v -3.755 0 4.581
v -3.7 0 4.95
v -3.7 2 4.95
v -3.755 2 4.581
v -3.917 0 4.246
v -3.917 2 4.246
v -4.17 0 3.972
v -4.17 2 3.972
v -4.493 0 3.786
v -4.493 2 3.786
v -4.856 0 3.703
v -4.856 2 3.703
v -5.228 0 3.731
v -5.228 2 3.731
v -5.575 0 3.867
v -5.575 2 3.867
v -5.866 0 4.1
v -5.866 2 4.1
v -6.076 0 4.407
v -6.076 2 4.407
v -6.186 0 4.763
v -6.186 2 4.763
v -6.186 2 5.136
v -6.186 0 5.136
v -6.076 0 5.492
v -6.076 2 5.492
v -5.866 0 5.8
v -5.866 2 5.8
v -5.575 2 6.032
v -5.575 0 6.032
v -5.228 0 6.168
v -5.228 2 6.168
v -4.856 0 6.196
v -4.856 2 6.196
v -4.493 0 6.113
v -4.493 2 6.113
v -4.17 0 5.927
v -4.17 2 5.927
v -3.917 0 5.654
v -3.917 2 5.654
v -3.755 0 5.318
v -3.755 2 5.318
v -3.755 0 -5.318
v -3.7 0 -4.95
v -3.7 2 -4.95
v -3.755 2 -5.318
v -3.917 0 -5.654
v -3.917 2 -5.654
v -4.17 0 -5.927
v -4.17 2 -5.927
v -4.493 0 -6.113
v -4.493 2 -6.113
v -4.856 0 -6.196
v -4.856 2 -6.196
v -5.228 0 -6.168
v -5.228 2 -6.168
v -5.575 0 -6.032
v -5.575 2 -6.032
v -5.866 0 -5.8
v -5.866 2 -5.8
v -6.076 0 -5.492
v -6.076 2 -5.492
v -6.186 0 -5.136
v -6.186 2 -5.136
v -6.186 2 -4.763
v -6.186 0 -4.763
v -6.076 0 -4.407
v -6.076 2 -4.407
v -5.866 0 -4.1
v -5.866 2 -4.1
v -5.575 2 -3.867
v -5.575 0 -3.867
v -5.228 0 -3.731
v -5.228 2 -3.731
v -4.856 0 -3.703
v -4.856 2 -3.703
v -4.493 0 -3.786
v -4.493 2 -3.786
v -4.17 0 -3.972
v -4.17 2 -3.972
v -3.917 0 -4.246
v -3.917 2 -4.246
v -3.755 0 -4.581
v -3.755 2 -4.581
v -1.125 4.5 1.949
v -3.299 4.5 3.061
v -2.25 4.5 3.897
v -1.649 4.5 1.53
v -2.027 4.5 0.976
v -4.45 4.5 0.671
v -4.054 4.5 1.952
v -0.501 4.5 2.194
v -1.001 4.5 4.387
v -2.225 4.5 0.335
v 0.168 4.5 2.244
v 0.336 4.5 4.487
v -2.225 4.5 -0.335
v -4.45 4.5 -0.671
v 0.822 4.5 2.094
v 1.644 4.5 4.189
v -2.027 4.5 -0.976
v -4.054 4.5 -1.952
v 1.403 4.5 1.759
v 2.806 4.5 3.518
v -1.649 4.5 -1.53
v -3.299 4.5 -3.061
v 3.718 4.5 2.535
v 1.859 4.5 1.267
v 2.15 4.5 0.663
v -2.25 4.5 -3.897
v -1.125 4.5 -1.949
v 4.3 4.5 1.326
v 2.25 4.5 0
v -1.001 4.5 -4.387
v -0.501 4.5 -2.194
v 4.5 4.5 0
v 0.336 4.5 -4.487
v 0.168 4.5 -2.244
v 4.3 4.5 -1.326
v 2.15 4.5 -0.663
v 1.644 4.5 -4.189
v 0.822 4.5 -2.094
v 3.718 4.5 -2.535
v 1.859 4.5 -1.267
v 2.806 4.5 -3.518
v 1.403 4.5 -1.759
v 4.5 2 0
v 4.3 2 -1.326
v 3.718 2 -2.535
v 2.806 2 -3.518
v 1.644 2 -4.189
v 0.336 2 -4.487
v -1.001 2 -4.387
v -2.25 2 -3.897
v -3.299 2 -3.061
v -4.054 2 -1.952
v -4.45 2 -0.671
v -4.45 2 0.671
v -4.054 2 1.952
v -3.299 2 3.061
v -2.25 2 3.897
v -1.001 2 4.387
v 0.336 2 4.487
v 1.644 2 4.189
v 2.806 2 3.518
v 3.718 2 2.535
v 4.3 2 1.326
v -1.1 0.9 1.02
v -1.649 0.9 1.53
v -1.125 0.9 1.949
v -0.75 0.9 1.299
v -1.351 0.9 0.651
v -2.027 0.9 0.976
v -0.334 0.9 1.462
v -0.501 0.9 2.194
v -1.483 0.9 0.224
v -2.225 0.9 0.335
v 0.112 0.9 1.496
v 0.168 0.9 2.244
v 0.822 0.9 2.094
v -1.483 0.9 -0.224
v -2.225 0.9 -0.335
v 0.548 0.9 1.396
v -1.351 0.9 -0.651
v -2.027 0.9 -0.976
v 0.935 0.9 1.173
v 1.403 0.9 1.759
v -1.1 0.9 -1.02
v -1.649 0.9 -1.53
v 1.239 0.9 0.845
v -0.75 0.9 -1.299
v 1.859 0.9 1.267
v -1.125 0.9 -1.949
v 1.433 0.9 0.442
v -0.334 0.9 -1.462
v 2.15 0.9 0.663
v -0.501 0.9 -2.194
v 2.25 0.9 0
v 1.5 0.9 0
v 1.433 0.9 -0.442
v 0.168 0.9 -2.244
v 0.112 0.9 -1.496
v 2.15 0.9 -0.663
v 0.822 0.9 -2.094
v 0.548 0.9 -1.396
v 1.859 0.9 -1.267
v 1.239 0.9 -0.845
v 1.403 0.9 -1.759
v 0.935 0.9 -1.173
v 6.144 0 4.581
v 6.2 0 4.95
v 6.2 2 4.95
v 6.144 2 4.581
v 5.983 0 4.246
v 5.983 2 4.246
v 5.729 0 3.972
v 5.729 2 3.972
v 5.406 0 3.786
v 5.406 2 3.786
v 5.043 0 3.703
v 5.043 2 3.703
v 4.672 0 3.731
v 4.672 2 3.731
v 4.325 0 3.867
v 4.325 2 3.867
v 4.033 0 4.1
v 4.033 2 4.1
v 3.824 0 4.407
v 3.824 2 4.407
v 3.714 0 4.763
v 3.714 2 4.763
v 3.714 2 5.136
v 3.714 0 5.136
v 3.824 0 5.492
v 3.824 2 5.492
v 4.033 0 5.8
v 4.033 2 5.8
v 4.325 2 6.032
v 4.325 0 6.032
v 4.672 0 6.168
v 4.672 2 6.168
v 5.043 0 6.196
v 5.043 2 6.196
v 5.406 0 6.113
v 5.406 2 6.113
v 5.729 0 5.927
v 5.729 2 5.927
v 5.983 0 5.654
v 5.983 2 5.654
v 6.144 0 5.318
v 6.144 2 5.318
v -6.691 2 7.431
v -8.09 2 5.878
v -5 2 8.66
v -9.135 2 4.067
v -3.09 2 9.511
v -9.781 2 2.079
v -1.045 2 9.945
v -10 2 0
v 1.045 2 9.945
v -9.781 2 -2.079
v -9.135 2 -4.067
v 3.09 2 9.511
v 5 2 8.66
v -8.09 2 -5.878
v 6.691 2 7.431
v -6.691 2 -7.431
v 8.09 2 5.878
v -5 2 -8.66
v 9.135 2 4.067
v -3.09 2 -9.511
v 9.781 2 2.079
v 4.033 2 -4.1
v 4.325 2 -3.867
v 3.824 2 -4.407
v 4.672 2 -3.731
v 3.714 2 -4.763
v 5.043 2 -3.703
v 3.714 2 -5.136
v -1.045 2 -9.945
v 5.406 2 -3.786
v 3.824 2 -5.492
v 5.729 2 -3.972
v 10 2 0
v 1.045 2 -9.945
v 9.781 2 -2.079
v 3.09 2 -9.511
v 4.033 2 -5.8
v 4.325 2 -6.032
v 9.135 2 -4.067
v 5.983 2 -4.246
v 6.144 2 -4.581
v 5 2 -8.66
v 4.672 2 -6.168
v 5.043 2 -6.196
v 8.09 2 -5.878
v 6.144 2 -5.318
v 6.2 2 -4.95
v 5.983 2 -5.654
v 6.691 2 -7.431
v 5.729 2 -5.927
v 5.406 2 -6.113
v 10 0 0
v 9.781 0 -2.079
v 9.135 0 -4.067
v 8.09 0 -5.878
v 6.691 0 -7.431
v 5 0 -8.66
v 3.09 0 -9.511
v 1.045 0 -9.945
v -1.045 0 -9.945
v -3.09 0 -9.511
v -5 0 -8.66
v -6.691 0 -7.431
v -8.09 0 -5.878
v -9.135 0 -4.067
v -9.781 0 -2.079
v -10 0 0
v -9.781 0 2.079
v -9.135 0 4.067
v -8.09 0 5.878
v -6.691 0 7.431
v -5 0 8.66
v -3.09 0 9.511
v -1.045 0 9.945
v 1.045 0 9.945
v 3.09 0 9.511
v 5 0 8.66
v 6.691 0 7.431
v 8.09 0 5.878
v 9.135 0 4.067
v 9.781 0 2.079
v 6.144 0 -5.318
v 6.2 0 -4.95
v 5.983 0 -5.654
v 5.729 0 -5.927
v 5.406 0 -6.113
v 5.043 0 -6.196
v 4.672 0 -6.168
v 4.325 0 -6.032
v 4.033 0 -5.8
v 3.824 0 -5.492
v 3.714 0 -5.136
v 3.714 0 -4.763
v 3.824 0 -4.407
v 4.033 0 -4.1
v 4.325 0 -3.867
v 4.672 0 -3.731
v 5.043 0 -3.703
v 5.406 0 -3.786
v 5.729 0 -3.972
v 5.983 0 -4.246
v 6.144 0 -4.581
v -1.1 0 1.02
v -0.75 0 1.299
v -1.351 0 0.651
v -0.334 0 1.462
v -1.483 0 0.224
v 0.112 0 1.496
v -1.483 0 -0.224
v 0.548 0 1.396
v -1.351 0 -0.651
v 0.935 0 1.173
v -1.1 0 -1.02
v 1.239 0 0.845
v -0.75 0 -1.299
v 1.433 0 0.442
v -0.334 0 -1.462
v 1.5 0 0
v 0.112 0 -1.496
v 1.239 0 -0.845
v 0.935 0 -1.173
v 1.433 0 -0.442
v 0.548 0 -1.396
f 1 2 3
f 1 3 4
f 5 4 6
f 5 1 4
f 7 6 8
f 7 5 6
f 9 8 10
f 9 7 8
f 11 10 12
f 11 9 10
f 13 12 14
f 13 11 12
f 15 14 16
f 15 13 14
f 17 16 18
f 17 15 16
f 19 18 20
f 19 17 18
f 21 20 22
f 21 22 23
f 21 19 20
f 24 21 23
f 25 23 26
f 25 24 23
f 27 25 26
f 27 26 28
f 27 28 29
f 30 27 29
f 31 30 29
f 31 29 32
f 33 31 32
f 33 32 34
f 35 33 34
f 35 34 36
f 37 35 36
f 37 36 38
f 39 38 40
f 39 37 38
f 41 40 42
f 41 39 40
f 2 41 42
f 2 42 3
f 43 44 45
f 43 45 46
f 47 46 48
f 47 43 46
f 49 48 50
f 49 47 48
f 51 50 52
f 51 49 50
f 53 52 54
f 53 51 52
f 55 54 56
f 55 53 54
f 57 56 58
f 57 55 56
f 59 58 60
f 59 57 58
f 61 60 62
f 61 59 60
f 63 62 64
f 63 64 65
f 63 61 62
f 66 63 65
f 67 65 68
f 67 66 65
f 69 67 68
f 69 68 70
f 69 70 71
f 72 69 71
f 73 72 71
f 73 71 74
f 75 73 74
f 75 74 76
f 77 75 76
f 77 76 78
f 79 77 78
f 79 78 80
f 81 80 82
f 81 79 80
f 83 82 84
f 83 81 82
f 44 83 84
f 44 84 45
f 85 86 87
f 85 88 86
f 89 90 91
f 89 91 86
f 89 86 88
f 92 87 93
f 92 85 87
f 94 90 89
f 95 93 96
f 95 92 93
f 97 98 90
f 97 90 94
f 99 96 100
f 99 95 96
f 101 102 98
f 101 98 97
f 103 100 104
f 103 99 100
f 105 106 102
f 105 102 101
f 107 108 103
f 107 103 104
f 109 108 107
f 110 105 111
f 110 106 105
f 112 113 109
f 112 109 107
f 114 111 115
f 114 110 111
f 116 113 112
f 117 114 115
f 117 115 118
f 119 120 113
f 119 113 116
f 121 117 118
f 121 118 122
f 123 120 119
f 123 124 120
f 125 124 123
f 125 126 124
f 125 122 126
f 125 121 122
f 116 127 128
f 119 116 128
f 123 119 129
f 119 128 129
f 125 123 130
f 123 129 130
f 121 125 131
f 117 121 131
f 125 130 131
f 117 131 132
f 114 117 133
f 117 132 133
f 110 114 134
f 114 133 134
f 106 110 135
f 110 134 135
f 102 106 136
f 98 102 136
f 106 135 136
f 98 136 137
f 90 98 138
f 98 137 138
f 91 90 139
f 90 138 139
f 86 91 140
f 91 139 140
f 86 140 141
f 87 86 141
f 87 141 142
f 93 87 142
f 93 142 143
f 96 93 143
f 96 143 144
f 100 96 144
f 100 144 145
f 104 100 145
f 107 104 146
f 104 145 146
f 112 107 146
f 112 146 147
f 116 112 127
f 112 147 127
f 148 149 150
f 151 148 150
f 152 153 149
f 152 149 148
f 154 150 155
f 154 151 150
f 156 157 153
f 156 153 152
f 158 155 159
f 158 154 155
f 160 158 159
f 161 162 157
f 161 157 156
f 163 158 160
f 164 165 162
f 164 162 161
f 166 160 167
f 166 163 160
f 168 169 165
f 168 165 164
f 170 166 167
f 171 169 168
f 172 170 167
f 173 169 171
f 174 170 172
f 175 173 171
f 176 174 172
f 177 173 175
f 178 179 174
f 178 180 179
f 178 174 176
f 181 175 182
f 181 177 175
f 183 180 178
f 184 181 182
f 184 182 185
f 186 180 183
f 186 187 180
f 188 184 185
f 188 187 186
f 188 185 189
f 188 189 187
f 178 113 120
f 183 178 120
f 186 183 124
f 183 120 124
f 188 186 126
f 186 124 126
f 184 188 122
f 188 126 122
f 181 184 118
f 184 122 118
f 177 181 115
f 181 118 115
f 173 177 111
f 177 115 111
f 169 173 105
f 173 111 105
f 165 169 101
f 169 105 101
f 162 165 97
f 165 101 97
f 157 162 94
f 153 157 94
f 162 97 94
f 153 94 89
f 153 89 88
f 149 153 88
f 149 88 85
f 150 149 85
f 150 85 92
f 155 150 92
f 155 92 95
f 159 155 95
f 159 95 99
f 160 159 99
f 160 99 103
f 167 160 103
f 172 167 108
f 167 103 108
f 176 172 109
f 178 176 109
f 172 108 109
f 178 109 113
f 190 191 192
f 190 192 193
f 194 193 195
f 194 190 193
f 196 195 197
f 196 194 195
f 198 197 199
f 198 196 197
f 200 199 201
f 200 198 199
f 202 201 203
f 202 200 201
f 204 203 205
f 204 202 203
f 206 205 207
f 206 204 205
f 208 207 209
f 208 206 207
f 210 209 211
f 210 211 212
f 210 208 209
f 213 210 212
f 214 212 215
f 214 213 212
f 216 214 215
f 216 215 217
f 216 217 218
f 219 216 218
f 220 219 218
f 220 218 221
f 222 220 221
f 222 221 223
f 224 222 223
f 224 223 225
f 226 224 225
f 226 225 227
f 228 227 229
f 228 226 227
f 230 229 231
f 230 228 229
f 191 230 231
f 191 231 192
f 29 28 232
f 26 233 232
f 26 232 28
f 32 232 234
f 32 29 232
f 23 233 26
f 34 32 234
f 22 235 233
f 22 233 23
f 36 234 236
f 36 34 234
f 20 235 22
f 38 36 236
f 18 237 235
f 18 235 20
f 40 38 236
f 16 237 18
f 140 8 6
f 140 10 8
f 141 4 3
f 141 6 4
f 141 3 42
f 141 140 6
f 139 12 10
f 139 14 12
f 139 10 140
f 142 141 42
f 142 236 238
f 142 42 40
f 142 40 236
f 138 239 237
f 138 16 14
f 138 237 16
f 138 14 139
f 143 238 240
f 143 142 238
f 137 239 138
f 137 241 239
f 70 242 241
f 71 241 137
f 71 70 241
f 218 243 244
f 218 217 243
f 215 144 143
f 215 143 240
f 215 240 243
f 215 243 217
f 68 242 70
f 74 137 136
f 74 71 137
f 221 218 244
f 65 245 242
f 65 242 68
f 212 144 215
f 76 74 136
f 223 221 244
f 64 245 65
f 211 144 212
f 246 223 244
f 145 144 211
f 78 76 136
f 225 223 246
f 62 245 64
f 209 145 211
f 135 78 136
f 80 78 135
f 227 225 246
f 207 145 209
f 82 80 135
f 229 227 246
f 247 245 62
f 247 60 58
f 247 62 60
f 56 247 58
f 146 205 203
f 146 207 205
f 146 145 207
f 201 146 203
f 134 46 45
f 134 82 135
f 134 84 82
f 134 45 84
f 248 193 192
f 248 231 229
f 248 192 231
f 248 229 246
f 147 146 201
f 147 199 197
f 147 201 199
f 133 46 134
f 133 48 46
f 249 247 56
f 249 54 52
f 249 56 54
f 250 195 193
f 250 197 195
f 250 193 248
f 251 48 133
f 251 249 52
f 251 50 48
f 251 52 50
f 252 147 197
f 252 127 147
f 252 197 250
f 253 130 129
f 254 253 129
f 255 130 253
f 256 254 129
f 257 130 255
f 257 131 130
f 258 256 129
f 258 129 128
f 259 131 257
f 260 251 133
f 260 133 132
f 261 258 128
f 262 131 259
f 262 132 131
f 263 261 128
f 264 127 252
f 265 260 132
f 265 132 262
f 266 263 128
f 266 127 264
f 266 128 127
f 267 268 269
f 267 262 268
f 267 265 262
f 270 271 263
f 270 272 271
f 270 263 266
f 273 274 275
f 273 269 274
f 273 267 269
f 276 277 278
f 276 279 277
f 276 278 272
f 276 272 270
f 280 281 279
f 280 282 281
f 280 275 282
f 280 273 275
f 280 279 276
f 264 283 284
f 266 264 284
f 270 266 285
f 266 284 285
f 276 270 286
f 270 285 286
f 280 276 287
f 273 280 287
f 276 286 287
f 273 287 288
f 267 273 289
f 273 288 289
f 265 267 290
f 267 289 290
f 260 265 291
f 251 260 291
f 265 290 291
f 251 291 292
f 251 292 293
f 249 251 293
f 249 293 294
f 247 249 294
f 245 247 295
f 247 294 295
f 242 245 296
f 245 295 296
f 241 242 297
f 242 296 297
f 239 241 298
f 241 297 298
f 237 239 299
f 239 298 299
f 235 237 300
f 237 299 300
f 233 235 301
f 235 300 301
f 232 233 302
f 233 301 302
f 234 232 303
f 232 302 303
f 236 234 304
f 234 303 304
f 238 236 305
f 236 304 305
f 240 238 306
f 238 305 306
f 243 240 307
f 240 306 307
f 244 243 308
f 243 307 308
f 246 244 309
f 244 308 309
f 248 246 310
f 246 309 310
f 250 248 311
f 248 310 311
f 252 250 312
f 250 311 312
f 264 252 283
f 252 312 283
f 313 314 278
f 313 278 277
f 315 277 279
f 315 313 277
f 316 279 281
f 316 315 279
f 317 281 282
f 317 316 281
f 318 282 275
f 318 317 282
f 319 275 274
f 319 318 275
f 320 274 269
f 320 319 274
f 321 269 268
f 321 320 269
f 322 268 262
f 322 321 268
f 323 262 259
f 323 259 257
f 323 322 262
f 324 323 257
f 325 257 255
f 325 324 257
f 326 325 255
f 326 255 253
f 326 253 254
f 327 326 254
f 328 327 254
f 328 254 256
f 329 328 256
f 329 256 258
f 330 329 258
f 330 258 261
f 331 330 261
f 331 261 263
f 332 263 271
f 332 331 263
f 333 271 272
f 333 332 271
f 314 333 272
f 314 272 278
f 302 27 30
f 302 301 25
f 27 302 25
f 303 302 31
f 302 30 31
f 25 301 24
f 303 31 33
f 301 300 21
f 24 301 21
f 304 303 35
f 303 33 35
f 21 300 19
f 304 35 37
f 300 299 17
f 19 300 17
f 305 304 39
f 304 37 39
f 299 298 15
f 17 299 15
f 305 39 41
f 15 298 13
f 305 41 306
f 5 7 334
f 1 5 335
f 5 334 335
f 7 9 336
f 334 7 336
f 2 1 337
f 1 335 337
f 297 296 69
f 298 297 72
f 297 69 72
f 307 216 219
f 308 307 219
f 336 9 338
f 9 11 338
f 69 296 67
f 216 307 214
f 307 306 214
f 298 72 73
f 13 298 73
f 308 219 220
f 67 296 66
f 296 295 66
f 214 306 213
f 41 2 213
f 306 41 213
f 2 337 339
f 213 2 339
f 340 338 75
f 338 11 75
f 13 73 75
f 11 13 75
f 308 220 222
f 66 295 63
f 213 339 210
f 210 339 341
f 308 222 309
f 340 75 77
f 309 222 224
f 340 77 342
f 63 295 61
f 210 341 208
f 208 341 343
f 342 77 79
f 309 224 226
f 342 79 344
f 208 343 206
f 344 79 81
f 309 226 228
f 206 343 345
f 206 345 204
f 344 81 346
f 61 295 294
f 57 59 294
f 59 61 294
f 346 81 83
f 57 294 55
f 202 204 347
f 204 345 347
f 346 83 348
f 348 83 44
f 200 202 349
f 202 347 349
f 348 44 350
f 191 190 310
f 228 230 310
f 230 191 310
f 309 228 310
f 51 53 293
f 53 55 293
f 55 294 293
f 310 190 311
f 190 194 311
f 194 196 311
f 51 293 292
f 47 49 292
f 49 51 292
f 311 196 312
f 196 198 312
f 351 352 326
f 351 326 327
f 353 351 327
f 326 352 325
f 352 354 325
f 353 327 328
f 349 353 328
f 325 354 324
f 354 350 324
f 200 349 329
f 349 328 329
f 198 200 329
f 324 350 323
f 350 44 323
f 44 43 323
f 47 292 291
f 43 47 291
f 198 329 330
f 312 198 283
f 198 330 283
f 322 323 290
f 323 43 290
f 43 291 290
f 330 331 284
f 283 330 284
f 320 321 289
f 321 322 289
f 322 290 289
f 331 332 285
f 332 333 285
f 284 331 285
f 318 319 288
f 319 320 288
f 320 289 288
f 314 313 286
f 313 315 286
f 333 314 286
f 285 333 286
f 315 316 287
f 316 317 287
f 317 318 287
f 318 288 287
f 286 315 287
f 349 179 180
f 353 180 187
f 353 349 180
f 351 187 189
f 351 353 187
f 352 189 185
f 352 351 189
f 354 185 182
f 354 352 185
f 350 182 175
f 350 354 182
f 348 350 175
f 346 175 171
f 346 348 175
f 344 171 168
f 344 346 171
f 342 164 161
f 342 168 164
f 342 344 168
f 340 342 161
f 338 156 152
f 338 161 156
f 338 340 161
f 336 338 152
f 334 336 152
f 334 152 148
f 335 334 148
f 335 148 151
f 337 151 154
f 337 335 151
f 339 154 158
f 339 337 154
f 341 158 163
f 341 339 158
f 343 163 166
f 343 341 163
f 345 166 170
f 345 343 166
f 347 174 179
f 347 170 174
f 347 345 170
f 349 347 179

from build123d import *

# Parameters (mm, degrees)
SKETCH1_R           = 10
SKETCH1_R_2         = 1.25
SKETCH1_R_3         = 1.5
BOSS_EXTRUDE1_DEPTH = 2
SKETCH2_R           = 4.5
SKETCH2_R_2         = 1.5
BOSS_EXTRUDE2_DEPTH = 2.5
SKETCH3_R           = 2.25
CUT_EXTRUDE1_DEPTH  = 3.6


with BuildPart() as part:
    # Sketch1 → Boss-Extrude1 (new body)
    with BuildSketch(Plane(origin=(0, 0, 0), x_dir=(1, 0, 0), z_dir=(0, 1, 0))):
        Circle(SKETCH1_R)
        with Locations((-4.949747468, 4.949747468)):
            Circle(SKETCH1_R_2, mode=Mode.SUBTRACT)
        with Locations((4.949747468, 4.949747468)):
            Circle(SKETCH1_R_2, mode=Mode.SUBTRACT)
        with Locations((4.949747468, -4.949747468)):
            Circle(SKETCH1_R_2, mode=Mode.SUBTRACT)
        with Locations((-4.949747468, -4.949747468)):
            Circle(SKETCH1_R_2, mode=Mode.SUBTRACT)
        Circle(SKETCH1_R_3, mode=Mode.SUBTRACT)
    extrude(amount=BOSS_EXTRUDE1_DEPTH)

    # Sketch2 → Boss-Extrude2 (add)
    with BuildSketch(Plane(origin=(0, 2, 0), x_dir=(1, 0, 0), z_dir=(0, 1, 0))):
        Circle(SKETCH2_R)
        Circle(SKETCH2_R_2, mode=Mode.SUBTRACT)
    extrude(amount=BOSS_EXTRUDE2_DEPTH)

    # Sketch3 → Cut-Extrude1 (cut)
    with BuildSketch(Plane(origin=(0, 4.5, 0), x_dir=(1, 0, 0), z_dir=(0, 1, 0))):
        Circle(SKETCH3_R)
    extrude(amount=-CUT_EXTRUDE1_DEPTH, mode=Mode.SUBTRACT)


solid = part.part
